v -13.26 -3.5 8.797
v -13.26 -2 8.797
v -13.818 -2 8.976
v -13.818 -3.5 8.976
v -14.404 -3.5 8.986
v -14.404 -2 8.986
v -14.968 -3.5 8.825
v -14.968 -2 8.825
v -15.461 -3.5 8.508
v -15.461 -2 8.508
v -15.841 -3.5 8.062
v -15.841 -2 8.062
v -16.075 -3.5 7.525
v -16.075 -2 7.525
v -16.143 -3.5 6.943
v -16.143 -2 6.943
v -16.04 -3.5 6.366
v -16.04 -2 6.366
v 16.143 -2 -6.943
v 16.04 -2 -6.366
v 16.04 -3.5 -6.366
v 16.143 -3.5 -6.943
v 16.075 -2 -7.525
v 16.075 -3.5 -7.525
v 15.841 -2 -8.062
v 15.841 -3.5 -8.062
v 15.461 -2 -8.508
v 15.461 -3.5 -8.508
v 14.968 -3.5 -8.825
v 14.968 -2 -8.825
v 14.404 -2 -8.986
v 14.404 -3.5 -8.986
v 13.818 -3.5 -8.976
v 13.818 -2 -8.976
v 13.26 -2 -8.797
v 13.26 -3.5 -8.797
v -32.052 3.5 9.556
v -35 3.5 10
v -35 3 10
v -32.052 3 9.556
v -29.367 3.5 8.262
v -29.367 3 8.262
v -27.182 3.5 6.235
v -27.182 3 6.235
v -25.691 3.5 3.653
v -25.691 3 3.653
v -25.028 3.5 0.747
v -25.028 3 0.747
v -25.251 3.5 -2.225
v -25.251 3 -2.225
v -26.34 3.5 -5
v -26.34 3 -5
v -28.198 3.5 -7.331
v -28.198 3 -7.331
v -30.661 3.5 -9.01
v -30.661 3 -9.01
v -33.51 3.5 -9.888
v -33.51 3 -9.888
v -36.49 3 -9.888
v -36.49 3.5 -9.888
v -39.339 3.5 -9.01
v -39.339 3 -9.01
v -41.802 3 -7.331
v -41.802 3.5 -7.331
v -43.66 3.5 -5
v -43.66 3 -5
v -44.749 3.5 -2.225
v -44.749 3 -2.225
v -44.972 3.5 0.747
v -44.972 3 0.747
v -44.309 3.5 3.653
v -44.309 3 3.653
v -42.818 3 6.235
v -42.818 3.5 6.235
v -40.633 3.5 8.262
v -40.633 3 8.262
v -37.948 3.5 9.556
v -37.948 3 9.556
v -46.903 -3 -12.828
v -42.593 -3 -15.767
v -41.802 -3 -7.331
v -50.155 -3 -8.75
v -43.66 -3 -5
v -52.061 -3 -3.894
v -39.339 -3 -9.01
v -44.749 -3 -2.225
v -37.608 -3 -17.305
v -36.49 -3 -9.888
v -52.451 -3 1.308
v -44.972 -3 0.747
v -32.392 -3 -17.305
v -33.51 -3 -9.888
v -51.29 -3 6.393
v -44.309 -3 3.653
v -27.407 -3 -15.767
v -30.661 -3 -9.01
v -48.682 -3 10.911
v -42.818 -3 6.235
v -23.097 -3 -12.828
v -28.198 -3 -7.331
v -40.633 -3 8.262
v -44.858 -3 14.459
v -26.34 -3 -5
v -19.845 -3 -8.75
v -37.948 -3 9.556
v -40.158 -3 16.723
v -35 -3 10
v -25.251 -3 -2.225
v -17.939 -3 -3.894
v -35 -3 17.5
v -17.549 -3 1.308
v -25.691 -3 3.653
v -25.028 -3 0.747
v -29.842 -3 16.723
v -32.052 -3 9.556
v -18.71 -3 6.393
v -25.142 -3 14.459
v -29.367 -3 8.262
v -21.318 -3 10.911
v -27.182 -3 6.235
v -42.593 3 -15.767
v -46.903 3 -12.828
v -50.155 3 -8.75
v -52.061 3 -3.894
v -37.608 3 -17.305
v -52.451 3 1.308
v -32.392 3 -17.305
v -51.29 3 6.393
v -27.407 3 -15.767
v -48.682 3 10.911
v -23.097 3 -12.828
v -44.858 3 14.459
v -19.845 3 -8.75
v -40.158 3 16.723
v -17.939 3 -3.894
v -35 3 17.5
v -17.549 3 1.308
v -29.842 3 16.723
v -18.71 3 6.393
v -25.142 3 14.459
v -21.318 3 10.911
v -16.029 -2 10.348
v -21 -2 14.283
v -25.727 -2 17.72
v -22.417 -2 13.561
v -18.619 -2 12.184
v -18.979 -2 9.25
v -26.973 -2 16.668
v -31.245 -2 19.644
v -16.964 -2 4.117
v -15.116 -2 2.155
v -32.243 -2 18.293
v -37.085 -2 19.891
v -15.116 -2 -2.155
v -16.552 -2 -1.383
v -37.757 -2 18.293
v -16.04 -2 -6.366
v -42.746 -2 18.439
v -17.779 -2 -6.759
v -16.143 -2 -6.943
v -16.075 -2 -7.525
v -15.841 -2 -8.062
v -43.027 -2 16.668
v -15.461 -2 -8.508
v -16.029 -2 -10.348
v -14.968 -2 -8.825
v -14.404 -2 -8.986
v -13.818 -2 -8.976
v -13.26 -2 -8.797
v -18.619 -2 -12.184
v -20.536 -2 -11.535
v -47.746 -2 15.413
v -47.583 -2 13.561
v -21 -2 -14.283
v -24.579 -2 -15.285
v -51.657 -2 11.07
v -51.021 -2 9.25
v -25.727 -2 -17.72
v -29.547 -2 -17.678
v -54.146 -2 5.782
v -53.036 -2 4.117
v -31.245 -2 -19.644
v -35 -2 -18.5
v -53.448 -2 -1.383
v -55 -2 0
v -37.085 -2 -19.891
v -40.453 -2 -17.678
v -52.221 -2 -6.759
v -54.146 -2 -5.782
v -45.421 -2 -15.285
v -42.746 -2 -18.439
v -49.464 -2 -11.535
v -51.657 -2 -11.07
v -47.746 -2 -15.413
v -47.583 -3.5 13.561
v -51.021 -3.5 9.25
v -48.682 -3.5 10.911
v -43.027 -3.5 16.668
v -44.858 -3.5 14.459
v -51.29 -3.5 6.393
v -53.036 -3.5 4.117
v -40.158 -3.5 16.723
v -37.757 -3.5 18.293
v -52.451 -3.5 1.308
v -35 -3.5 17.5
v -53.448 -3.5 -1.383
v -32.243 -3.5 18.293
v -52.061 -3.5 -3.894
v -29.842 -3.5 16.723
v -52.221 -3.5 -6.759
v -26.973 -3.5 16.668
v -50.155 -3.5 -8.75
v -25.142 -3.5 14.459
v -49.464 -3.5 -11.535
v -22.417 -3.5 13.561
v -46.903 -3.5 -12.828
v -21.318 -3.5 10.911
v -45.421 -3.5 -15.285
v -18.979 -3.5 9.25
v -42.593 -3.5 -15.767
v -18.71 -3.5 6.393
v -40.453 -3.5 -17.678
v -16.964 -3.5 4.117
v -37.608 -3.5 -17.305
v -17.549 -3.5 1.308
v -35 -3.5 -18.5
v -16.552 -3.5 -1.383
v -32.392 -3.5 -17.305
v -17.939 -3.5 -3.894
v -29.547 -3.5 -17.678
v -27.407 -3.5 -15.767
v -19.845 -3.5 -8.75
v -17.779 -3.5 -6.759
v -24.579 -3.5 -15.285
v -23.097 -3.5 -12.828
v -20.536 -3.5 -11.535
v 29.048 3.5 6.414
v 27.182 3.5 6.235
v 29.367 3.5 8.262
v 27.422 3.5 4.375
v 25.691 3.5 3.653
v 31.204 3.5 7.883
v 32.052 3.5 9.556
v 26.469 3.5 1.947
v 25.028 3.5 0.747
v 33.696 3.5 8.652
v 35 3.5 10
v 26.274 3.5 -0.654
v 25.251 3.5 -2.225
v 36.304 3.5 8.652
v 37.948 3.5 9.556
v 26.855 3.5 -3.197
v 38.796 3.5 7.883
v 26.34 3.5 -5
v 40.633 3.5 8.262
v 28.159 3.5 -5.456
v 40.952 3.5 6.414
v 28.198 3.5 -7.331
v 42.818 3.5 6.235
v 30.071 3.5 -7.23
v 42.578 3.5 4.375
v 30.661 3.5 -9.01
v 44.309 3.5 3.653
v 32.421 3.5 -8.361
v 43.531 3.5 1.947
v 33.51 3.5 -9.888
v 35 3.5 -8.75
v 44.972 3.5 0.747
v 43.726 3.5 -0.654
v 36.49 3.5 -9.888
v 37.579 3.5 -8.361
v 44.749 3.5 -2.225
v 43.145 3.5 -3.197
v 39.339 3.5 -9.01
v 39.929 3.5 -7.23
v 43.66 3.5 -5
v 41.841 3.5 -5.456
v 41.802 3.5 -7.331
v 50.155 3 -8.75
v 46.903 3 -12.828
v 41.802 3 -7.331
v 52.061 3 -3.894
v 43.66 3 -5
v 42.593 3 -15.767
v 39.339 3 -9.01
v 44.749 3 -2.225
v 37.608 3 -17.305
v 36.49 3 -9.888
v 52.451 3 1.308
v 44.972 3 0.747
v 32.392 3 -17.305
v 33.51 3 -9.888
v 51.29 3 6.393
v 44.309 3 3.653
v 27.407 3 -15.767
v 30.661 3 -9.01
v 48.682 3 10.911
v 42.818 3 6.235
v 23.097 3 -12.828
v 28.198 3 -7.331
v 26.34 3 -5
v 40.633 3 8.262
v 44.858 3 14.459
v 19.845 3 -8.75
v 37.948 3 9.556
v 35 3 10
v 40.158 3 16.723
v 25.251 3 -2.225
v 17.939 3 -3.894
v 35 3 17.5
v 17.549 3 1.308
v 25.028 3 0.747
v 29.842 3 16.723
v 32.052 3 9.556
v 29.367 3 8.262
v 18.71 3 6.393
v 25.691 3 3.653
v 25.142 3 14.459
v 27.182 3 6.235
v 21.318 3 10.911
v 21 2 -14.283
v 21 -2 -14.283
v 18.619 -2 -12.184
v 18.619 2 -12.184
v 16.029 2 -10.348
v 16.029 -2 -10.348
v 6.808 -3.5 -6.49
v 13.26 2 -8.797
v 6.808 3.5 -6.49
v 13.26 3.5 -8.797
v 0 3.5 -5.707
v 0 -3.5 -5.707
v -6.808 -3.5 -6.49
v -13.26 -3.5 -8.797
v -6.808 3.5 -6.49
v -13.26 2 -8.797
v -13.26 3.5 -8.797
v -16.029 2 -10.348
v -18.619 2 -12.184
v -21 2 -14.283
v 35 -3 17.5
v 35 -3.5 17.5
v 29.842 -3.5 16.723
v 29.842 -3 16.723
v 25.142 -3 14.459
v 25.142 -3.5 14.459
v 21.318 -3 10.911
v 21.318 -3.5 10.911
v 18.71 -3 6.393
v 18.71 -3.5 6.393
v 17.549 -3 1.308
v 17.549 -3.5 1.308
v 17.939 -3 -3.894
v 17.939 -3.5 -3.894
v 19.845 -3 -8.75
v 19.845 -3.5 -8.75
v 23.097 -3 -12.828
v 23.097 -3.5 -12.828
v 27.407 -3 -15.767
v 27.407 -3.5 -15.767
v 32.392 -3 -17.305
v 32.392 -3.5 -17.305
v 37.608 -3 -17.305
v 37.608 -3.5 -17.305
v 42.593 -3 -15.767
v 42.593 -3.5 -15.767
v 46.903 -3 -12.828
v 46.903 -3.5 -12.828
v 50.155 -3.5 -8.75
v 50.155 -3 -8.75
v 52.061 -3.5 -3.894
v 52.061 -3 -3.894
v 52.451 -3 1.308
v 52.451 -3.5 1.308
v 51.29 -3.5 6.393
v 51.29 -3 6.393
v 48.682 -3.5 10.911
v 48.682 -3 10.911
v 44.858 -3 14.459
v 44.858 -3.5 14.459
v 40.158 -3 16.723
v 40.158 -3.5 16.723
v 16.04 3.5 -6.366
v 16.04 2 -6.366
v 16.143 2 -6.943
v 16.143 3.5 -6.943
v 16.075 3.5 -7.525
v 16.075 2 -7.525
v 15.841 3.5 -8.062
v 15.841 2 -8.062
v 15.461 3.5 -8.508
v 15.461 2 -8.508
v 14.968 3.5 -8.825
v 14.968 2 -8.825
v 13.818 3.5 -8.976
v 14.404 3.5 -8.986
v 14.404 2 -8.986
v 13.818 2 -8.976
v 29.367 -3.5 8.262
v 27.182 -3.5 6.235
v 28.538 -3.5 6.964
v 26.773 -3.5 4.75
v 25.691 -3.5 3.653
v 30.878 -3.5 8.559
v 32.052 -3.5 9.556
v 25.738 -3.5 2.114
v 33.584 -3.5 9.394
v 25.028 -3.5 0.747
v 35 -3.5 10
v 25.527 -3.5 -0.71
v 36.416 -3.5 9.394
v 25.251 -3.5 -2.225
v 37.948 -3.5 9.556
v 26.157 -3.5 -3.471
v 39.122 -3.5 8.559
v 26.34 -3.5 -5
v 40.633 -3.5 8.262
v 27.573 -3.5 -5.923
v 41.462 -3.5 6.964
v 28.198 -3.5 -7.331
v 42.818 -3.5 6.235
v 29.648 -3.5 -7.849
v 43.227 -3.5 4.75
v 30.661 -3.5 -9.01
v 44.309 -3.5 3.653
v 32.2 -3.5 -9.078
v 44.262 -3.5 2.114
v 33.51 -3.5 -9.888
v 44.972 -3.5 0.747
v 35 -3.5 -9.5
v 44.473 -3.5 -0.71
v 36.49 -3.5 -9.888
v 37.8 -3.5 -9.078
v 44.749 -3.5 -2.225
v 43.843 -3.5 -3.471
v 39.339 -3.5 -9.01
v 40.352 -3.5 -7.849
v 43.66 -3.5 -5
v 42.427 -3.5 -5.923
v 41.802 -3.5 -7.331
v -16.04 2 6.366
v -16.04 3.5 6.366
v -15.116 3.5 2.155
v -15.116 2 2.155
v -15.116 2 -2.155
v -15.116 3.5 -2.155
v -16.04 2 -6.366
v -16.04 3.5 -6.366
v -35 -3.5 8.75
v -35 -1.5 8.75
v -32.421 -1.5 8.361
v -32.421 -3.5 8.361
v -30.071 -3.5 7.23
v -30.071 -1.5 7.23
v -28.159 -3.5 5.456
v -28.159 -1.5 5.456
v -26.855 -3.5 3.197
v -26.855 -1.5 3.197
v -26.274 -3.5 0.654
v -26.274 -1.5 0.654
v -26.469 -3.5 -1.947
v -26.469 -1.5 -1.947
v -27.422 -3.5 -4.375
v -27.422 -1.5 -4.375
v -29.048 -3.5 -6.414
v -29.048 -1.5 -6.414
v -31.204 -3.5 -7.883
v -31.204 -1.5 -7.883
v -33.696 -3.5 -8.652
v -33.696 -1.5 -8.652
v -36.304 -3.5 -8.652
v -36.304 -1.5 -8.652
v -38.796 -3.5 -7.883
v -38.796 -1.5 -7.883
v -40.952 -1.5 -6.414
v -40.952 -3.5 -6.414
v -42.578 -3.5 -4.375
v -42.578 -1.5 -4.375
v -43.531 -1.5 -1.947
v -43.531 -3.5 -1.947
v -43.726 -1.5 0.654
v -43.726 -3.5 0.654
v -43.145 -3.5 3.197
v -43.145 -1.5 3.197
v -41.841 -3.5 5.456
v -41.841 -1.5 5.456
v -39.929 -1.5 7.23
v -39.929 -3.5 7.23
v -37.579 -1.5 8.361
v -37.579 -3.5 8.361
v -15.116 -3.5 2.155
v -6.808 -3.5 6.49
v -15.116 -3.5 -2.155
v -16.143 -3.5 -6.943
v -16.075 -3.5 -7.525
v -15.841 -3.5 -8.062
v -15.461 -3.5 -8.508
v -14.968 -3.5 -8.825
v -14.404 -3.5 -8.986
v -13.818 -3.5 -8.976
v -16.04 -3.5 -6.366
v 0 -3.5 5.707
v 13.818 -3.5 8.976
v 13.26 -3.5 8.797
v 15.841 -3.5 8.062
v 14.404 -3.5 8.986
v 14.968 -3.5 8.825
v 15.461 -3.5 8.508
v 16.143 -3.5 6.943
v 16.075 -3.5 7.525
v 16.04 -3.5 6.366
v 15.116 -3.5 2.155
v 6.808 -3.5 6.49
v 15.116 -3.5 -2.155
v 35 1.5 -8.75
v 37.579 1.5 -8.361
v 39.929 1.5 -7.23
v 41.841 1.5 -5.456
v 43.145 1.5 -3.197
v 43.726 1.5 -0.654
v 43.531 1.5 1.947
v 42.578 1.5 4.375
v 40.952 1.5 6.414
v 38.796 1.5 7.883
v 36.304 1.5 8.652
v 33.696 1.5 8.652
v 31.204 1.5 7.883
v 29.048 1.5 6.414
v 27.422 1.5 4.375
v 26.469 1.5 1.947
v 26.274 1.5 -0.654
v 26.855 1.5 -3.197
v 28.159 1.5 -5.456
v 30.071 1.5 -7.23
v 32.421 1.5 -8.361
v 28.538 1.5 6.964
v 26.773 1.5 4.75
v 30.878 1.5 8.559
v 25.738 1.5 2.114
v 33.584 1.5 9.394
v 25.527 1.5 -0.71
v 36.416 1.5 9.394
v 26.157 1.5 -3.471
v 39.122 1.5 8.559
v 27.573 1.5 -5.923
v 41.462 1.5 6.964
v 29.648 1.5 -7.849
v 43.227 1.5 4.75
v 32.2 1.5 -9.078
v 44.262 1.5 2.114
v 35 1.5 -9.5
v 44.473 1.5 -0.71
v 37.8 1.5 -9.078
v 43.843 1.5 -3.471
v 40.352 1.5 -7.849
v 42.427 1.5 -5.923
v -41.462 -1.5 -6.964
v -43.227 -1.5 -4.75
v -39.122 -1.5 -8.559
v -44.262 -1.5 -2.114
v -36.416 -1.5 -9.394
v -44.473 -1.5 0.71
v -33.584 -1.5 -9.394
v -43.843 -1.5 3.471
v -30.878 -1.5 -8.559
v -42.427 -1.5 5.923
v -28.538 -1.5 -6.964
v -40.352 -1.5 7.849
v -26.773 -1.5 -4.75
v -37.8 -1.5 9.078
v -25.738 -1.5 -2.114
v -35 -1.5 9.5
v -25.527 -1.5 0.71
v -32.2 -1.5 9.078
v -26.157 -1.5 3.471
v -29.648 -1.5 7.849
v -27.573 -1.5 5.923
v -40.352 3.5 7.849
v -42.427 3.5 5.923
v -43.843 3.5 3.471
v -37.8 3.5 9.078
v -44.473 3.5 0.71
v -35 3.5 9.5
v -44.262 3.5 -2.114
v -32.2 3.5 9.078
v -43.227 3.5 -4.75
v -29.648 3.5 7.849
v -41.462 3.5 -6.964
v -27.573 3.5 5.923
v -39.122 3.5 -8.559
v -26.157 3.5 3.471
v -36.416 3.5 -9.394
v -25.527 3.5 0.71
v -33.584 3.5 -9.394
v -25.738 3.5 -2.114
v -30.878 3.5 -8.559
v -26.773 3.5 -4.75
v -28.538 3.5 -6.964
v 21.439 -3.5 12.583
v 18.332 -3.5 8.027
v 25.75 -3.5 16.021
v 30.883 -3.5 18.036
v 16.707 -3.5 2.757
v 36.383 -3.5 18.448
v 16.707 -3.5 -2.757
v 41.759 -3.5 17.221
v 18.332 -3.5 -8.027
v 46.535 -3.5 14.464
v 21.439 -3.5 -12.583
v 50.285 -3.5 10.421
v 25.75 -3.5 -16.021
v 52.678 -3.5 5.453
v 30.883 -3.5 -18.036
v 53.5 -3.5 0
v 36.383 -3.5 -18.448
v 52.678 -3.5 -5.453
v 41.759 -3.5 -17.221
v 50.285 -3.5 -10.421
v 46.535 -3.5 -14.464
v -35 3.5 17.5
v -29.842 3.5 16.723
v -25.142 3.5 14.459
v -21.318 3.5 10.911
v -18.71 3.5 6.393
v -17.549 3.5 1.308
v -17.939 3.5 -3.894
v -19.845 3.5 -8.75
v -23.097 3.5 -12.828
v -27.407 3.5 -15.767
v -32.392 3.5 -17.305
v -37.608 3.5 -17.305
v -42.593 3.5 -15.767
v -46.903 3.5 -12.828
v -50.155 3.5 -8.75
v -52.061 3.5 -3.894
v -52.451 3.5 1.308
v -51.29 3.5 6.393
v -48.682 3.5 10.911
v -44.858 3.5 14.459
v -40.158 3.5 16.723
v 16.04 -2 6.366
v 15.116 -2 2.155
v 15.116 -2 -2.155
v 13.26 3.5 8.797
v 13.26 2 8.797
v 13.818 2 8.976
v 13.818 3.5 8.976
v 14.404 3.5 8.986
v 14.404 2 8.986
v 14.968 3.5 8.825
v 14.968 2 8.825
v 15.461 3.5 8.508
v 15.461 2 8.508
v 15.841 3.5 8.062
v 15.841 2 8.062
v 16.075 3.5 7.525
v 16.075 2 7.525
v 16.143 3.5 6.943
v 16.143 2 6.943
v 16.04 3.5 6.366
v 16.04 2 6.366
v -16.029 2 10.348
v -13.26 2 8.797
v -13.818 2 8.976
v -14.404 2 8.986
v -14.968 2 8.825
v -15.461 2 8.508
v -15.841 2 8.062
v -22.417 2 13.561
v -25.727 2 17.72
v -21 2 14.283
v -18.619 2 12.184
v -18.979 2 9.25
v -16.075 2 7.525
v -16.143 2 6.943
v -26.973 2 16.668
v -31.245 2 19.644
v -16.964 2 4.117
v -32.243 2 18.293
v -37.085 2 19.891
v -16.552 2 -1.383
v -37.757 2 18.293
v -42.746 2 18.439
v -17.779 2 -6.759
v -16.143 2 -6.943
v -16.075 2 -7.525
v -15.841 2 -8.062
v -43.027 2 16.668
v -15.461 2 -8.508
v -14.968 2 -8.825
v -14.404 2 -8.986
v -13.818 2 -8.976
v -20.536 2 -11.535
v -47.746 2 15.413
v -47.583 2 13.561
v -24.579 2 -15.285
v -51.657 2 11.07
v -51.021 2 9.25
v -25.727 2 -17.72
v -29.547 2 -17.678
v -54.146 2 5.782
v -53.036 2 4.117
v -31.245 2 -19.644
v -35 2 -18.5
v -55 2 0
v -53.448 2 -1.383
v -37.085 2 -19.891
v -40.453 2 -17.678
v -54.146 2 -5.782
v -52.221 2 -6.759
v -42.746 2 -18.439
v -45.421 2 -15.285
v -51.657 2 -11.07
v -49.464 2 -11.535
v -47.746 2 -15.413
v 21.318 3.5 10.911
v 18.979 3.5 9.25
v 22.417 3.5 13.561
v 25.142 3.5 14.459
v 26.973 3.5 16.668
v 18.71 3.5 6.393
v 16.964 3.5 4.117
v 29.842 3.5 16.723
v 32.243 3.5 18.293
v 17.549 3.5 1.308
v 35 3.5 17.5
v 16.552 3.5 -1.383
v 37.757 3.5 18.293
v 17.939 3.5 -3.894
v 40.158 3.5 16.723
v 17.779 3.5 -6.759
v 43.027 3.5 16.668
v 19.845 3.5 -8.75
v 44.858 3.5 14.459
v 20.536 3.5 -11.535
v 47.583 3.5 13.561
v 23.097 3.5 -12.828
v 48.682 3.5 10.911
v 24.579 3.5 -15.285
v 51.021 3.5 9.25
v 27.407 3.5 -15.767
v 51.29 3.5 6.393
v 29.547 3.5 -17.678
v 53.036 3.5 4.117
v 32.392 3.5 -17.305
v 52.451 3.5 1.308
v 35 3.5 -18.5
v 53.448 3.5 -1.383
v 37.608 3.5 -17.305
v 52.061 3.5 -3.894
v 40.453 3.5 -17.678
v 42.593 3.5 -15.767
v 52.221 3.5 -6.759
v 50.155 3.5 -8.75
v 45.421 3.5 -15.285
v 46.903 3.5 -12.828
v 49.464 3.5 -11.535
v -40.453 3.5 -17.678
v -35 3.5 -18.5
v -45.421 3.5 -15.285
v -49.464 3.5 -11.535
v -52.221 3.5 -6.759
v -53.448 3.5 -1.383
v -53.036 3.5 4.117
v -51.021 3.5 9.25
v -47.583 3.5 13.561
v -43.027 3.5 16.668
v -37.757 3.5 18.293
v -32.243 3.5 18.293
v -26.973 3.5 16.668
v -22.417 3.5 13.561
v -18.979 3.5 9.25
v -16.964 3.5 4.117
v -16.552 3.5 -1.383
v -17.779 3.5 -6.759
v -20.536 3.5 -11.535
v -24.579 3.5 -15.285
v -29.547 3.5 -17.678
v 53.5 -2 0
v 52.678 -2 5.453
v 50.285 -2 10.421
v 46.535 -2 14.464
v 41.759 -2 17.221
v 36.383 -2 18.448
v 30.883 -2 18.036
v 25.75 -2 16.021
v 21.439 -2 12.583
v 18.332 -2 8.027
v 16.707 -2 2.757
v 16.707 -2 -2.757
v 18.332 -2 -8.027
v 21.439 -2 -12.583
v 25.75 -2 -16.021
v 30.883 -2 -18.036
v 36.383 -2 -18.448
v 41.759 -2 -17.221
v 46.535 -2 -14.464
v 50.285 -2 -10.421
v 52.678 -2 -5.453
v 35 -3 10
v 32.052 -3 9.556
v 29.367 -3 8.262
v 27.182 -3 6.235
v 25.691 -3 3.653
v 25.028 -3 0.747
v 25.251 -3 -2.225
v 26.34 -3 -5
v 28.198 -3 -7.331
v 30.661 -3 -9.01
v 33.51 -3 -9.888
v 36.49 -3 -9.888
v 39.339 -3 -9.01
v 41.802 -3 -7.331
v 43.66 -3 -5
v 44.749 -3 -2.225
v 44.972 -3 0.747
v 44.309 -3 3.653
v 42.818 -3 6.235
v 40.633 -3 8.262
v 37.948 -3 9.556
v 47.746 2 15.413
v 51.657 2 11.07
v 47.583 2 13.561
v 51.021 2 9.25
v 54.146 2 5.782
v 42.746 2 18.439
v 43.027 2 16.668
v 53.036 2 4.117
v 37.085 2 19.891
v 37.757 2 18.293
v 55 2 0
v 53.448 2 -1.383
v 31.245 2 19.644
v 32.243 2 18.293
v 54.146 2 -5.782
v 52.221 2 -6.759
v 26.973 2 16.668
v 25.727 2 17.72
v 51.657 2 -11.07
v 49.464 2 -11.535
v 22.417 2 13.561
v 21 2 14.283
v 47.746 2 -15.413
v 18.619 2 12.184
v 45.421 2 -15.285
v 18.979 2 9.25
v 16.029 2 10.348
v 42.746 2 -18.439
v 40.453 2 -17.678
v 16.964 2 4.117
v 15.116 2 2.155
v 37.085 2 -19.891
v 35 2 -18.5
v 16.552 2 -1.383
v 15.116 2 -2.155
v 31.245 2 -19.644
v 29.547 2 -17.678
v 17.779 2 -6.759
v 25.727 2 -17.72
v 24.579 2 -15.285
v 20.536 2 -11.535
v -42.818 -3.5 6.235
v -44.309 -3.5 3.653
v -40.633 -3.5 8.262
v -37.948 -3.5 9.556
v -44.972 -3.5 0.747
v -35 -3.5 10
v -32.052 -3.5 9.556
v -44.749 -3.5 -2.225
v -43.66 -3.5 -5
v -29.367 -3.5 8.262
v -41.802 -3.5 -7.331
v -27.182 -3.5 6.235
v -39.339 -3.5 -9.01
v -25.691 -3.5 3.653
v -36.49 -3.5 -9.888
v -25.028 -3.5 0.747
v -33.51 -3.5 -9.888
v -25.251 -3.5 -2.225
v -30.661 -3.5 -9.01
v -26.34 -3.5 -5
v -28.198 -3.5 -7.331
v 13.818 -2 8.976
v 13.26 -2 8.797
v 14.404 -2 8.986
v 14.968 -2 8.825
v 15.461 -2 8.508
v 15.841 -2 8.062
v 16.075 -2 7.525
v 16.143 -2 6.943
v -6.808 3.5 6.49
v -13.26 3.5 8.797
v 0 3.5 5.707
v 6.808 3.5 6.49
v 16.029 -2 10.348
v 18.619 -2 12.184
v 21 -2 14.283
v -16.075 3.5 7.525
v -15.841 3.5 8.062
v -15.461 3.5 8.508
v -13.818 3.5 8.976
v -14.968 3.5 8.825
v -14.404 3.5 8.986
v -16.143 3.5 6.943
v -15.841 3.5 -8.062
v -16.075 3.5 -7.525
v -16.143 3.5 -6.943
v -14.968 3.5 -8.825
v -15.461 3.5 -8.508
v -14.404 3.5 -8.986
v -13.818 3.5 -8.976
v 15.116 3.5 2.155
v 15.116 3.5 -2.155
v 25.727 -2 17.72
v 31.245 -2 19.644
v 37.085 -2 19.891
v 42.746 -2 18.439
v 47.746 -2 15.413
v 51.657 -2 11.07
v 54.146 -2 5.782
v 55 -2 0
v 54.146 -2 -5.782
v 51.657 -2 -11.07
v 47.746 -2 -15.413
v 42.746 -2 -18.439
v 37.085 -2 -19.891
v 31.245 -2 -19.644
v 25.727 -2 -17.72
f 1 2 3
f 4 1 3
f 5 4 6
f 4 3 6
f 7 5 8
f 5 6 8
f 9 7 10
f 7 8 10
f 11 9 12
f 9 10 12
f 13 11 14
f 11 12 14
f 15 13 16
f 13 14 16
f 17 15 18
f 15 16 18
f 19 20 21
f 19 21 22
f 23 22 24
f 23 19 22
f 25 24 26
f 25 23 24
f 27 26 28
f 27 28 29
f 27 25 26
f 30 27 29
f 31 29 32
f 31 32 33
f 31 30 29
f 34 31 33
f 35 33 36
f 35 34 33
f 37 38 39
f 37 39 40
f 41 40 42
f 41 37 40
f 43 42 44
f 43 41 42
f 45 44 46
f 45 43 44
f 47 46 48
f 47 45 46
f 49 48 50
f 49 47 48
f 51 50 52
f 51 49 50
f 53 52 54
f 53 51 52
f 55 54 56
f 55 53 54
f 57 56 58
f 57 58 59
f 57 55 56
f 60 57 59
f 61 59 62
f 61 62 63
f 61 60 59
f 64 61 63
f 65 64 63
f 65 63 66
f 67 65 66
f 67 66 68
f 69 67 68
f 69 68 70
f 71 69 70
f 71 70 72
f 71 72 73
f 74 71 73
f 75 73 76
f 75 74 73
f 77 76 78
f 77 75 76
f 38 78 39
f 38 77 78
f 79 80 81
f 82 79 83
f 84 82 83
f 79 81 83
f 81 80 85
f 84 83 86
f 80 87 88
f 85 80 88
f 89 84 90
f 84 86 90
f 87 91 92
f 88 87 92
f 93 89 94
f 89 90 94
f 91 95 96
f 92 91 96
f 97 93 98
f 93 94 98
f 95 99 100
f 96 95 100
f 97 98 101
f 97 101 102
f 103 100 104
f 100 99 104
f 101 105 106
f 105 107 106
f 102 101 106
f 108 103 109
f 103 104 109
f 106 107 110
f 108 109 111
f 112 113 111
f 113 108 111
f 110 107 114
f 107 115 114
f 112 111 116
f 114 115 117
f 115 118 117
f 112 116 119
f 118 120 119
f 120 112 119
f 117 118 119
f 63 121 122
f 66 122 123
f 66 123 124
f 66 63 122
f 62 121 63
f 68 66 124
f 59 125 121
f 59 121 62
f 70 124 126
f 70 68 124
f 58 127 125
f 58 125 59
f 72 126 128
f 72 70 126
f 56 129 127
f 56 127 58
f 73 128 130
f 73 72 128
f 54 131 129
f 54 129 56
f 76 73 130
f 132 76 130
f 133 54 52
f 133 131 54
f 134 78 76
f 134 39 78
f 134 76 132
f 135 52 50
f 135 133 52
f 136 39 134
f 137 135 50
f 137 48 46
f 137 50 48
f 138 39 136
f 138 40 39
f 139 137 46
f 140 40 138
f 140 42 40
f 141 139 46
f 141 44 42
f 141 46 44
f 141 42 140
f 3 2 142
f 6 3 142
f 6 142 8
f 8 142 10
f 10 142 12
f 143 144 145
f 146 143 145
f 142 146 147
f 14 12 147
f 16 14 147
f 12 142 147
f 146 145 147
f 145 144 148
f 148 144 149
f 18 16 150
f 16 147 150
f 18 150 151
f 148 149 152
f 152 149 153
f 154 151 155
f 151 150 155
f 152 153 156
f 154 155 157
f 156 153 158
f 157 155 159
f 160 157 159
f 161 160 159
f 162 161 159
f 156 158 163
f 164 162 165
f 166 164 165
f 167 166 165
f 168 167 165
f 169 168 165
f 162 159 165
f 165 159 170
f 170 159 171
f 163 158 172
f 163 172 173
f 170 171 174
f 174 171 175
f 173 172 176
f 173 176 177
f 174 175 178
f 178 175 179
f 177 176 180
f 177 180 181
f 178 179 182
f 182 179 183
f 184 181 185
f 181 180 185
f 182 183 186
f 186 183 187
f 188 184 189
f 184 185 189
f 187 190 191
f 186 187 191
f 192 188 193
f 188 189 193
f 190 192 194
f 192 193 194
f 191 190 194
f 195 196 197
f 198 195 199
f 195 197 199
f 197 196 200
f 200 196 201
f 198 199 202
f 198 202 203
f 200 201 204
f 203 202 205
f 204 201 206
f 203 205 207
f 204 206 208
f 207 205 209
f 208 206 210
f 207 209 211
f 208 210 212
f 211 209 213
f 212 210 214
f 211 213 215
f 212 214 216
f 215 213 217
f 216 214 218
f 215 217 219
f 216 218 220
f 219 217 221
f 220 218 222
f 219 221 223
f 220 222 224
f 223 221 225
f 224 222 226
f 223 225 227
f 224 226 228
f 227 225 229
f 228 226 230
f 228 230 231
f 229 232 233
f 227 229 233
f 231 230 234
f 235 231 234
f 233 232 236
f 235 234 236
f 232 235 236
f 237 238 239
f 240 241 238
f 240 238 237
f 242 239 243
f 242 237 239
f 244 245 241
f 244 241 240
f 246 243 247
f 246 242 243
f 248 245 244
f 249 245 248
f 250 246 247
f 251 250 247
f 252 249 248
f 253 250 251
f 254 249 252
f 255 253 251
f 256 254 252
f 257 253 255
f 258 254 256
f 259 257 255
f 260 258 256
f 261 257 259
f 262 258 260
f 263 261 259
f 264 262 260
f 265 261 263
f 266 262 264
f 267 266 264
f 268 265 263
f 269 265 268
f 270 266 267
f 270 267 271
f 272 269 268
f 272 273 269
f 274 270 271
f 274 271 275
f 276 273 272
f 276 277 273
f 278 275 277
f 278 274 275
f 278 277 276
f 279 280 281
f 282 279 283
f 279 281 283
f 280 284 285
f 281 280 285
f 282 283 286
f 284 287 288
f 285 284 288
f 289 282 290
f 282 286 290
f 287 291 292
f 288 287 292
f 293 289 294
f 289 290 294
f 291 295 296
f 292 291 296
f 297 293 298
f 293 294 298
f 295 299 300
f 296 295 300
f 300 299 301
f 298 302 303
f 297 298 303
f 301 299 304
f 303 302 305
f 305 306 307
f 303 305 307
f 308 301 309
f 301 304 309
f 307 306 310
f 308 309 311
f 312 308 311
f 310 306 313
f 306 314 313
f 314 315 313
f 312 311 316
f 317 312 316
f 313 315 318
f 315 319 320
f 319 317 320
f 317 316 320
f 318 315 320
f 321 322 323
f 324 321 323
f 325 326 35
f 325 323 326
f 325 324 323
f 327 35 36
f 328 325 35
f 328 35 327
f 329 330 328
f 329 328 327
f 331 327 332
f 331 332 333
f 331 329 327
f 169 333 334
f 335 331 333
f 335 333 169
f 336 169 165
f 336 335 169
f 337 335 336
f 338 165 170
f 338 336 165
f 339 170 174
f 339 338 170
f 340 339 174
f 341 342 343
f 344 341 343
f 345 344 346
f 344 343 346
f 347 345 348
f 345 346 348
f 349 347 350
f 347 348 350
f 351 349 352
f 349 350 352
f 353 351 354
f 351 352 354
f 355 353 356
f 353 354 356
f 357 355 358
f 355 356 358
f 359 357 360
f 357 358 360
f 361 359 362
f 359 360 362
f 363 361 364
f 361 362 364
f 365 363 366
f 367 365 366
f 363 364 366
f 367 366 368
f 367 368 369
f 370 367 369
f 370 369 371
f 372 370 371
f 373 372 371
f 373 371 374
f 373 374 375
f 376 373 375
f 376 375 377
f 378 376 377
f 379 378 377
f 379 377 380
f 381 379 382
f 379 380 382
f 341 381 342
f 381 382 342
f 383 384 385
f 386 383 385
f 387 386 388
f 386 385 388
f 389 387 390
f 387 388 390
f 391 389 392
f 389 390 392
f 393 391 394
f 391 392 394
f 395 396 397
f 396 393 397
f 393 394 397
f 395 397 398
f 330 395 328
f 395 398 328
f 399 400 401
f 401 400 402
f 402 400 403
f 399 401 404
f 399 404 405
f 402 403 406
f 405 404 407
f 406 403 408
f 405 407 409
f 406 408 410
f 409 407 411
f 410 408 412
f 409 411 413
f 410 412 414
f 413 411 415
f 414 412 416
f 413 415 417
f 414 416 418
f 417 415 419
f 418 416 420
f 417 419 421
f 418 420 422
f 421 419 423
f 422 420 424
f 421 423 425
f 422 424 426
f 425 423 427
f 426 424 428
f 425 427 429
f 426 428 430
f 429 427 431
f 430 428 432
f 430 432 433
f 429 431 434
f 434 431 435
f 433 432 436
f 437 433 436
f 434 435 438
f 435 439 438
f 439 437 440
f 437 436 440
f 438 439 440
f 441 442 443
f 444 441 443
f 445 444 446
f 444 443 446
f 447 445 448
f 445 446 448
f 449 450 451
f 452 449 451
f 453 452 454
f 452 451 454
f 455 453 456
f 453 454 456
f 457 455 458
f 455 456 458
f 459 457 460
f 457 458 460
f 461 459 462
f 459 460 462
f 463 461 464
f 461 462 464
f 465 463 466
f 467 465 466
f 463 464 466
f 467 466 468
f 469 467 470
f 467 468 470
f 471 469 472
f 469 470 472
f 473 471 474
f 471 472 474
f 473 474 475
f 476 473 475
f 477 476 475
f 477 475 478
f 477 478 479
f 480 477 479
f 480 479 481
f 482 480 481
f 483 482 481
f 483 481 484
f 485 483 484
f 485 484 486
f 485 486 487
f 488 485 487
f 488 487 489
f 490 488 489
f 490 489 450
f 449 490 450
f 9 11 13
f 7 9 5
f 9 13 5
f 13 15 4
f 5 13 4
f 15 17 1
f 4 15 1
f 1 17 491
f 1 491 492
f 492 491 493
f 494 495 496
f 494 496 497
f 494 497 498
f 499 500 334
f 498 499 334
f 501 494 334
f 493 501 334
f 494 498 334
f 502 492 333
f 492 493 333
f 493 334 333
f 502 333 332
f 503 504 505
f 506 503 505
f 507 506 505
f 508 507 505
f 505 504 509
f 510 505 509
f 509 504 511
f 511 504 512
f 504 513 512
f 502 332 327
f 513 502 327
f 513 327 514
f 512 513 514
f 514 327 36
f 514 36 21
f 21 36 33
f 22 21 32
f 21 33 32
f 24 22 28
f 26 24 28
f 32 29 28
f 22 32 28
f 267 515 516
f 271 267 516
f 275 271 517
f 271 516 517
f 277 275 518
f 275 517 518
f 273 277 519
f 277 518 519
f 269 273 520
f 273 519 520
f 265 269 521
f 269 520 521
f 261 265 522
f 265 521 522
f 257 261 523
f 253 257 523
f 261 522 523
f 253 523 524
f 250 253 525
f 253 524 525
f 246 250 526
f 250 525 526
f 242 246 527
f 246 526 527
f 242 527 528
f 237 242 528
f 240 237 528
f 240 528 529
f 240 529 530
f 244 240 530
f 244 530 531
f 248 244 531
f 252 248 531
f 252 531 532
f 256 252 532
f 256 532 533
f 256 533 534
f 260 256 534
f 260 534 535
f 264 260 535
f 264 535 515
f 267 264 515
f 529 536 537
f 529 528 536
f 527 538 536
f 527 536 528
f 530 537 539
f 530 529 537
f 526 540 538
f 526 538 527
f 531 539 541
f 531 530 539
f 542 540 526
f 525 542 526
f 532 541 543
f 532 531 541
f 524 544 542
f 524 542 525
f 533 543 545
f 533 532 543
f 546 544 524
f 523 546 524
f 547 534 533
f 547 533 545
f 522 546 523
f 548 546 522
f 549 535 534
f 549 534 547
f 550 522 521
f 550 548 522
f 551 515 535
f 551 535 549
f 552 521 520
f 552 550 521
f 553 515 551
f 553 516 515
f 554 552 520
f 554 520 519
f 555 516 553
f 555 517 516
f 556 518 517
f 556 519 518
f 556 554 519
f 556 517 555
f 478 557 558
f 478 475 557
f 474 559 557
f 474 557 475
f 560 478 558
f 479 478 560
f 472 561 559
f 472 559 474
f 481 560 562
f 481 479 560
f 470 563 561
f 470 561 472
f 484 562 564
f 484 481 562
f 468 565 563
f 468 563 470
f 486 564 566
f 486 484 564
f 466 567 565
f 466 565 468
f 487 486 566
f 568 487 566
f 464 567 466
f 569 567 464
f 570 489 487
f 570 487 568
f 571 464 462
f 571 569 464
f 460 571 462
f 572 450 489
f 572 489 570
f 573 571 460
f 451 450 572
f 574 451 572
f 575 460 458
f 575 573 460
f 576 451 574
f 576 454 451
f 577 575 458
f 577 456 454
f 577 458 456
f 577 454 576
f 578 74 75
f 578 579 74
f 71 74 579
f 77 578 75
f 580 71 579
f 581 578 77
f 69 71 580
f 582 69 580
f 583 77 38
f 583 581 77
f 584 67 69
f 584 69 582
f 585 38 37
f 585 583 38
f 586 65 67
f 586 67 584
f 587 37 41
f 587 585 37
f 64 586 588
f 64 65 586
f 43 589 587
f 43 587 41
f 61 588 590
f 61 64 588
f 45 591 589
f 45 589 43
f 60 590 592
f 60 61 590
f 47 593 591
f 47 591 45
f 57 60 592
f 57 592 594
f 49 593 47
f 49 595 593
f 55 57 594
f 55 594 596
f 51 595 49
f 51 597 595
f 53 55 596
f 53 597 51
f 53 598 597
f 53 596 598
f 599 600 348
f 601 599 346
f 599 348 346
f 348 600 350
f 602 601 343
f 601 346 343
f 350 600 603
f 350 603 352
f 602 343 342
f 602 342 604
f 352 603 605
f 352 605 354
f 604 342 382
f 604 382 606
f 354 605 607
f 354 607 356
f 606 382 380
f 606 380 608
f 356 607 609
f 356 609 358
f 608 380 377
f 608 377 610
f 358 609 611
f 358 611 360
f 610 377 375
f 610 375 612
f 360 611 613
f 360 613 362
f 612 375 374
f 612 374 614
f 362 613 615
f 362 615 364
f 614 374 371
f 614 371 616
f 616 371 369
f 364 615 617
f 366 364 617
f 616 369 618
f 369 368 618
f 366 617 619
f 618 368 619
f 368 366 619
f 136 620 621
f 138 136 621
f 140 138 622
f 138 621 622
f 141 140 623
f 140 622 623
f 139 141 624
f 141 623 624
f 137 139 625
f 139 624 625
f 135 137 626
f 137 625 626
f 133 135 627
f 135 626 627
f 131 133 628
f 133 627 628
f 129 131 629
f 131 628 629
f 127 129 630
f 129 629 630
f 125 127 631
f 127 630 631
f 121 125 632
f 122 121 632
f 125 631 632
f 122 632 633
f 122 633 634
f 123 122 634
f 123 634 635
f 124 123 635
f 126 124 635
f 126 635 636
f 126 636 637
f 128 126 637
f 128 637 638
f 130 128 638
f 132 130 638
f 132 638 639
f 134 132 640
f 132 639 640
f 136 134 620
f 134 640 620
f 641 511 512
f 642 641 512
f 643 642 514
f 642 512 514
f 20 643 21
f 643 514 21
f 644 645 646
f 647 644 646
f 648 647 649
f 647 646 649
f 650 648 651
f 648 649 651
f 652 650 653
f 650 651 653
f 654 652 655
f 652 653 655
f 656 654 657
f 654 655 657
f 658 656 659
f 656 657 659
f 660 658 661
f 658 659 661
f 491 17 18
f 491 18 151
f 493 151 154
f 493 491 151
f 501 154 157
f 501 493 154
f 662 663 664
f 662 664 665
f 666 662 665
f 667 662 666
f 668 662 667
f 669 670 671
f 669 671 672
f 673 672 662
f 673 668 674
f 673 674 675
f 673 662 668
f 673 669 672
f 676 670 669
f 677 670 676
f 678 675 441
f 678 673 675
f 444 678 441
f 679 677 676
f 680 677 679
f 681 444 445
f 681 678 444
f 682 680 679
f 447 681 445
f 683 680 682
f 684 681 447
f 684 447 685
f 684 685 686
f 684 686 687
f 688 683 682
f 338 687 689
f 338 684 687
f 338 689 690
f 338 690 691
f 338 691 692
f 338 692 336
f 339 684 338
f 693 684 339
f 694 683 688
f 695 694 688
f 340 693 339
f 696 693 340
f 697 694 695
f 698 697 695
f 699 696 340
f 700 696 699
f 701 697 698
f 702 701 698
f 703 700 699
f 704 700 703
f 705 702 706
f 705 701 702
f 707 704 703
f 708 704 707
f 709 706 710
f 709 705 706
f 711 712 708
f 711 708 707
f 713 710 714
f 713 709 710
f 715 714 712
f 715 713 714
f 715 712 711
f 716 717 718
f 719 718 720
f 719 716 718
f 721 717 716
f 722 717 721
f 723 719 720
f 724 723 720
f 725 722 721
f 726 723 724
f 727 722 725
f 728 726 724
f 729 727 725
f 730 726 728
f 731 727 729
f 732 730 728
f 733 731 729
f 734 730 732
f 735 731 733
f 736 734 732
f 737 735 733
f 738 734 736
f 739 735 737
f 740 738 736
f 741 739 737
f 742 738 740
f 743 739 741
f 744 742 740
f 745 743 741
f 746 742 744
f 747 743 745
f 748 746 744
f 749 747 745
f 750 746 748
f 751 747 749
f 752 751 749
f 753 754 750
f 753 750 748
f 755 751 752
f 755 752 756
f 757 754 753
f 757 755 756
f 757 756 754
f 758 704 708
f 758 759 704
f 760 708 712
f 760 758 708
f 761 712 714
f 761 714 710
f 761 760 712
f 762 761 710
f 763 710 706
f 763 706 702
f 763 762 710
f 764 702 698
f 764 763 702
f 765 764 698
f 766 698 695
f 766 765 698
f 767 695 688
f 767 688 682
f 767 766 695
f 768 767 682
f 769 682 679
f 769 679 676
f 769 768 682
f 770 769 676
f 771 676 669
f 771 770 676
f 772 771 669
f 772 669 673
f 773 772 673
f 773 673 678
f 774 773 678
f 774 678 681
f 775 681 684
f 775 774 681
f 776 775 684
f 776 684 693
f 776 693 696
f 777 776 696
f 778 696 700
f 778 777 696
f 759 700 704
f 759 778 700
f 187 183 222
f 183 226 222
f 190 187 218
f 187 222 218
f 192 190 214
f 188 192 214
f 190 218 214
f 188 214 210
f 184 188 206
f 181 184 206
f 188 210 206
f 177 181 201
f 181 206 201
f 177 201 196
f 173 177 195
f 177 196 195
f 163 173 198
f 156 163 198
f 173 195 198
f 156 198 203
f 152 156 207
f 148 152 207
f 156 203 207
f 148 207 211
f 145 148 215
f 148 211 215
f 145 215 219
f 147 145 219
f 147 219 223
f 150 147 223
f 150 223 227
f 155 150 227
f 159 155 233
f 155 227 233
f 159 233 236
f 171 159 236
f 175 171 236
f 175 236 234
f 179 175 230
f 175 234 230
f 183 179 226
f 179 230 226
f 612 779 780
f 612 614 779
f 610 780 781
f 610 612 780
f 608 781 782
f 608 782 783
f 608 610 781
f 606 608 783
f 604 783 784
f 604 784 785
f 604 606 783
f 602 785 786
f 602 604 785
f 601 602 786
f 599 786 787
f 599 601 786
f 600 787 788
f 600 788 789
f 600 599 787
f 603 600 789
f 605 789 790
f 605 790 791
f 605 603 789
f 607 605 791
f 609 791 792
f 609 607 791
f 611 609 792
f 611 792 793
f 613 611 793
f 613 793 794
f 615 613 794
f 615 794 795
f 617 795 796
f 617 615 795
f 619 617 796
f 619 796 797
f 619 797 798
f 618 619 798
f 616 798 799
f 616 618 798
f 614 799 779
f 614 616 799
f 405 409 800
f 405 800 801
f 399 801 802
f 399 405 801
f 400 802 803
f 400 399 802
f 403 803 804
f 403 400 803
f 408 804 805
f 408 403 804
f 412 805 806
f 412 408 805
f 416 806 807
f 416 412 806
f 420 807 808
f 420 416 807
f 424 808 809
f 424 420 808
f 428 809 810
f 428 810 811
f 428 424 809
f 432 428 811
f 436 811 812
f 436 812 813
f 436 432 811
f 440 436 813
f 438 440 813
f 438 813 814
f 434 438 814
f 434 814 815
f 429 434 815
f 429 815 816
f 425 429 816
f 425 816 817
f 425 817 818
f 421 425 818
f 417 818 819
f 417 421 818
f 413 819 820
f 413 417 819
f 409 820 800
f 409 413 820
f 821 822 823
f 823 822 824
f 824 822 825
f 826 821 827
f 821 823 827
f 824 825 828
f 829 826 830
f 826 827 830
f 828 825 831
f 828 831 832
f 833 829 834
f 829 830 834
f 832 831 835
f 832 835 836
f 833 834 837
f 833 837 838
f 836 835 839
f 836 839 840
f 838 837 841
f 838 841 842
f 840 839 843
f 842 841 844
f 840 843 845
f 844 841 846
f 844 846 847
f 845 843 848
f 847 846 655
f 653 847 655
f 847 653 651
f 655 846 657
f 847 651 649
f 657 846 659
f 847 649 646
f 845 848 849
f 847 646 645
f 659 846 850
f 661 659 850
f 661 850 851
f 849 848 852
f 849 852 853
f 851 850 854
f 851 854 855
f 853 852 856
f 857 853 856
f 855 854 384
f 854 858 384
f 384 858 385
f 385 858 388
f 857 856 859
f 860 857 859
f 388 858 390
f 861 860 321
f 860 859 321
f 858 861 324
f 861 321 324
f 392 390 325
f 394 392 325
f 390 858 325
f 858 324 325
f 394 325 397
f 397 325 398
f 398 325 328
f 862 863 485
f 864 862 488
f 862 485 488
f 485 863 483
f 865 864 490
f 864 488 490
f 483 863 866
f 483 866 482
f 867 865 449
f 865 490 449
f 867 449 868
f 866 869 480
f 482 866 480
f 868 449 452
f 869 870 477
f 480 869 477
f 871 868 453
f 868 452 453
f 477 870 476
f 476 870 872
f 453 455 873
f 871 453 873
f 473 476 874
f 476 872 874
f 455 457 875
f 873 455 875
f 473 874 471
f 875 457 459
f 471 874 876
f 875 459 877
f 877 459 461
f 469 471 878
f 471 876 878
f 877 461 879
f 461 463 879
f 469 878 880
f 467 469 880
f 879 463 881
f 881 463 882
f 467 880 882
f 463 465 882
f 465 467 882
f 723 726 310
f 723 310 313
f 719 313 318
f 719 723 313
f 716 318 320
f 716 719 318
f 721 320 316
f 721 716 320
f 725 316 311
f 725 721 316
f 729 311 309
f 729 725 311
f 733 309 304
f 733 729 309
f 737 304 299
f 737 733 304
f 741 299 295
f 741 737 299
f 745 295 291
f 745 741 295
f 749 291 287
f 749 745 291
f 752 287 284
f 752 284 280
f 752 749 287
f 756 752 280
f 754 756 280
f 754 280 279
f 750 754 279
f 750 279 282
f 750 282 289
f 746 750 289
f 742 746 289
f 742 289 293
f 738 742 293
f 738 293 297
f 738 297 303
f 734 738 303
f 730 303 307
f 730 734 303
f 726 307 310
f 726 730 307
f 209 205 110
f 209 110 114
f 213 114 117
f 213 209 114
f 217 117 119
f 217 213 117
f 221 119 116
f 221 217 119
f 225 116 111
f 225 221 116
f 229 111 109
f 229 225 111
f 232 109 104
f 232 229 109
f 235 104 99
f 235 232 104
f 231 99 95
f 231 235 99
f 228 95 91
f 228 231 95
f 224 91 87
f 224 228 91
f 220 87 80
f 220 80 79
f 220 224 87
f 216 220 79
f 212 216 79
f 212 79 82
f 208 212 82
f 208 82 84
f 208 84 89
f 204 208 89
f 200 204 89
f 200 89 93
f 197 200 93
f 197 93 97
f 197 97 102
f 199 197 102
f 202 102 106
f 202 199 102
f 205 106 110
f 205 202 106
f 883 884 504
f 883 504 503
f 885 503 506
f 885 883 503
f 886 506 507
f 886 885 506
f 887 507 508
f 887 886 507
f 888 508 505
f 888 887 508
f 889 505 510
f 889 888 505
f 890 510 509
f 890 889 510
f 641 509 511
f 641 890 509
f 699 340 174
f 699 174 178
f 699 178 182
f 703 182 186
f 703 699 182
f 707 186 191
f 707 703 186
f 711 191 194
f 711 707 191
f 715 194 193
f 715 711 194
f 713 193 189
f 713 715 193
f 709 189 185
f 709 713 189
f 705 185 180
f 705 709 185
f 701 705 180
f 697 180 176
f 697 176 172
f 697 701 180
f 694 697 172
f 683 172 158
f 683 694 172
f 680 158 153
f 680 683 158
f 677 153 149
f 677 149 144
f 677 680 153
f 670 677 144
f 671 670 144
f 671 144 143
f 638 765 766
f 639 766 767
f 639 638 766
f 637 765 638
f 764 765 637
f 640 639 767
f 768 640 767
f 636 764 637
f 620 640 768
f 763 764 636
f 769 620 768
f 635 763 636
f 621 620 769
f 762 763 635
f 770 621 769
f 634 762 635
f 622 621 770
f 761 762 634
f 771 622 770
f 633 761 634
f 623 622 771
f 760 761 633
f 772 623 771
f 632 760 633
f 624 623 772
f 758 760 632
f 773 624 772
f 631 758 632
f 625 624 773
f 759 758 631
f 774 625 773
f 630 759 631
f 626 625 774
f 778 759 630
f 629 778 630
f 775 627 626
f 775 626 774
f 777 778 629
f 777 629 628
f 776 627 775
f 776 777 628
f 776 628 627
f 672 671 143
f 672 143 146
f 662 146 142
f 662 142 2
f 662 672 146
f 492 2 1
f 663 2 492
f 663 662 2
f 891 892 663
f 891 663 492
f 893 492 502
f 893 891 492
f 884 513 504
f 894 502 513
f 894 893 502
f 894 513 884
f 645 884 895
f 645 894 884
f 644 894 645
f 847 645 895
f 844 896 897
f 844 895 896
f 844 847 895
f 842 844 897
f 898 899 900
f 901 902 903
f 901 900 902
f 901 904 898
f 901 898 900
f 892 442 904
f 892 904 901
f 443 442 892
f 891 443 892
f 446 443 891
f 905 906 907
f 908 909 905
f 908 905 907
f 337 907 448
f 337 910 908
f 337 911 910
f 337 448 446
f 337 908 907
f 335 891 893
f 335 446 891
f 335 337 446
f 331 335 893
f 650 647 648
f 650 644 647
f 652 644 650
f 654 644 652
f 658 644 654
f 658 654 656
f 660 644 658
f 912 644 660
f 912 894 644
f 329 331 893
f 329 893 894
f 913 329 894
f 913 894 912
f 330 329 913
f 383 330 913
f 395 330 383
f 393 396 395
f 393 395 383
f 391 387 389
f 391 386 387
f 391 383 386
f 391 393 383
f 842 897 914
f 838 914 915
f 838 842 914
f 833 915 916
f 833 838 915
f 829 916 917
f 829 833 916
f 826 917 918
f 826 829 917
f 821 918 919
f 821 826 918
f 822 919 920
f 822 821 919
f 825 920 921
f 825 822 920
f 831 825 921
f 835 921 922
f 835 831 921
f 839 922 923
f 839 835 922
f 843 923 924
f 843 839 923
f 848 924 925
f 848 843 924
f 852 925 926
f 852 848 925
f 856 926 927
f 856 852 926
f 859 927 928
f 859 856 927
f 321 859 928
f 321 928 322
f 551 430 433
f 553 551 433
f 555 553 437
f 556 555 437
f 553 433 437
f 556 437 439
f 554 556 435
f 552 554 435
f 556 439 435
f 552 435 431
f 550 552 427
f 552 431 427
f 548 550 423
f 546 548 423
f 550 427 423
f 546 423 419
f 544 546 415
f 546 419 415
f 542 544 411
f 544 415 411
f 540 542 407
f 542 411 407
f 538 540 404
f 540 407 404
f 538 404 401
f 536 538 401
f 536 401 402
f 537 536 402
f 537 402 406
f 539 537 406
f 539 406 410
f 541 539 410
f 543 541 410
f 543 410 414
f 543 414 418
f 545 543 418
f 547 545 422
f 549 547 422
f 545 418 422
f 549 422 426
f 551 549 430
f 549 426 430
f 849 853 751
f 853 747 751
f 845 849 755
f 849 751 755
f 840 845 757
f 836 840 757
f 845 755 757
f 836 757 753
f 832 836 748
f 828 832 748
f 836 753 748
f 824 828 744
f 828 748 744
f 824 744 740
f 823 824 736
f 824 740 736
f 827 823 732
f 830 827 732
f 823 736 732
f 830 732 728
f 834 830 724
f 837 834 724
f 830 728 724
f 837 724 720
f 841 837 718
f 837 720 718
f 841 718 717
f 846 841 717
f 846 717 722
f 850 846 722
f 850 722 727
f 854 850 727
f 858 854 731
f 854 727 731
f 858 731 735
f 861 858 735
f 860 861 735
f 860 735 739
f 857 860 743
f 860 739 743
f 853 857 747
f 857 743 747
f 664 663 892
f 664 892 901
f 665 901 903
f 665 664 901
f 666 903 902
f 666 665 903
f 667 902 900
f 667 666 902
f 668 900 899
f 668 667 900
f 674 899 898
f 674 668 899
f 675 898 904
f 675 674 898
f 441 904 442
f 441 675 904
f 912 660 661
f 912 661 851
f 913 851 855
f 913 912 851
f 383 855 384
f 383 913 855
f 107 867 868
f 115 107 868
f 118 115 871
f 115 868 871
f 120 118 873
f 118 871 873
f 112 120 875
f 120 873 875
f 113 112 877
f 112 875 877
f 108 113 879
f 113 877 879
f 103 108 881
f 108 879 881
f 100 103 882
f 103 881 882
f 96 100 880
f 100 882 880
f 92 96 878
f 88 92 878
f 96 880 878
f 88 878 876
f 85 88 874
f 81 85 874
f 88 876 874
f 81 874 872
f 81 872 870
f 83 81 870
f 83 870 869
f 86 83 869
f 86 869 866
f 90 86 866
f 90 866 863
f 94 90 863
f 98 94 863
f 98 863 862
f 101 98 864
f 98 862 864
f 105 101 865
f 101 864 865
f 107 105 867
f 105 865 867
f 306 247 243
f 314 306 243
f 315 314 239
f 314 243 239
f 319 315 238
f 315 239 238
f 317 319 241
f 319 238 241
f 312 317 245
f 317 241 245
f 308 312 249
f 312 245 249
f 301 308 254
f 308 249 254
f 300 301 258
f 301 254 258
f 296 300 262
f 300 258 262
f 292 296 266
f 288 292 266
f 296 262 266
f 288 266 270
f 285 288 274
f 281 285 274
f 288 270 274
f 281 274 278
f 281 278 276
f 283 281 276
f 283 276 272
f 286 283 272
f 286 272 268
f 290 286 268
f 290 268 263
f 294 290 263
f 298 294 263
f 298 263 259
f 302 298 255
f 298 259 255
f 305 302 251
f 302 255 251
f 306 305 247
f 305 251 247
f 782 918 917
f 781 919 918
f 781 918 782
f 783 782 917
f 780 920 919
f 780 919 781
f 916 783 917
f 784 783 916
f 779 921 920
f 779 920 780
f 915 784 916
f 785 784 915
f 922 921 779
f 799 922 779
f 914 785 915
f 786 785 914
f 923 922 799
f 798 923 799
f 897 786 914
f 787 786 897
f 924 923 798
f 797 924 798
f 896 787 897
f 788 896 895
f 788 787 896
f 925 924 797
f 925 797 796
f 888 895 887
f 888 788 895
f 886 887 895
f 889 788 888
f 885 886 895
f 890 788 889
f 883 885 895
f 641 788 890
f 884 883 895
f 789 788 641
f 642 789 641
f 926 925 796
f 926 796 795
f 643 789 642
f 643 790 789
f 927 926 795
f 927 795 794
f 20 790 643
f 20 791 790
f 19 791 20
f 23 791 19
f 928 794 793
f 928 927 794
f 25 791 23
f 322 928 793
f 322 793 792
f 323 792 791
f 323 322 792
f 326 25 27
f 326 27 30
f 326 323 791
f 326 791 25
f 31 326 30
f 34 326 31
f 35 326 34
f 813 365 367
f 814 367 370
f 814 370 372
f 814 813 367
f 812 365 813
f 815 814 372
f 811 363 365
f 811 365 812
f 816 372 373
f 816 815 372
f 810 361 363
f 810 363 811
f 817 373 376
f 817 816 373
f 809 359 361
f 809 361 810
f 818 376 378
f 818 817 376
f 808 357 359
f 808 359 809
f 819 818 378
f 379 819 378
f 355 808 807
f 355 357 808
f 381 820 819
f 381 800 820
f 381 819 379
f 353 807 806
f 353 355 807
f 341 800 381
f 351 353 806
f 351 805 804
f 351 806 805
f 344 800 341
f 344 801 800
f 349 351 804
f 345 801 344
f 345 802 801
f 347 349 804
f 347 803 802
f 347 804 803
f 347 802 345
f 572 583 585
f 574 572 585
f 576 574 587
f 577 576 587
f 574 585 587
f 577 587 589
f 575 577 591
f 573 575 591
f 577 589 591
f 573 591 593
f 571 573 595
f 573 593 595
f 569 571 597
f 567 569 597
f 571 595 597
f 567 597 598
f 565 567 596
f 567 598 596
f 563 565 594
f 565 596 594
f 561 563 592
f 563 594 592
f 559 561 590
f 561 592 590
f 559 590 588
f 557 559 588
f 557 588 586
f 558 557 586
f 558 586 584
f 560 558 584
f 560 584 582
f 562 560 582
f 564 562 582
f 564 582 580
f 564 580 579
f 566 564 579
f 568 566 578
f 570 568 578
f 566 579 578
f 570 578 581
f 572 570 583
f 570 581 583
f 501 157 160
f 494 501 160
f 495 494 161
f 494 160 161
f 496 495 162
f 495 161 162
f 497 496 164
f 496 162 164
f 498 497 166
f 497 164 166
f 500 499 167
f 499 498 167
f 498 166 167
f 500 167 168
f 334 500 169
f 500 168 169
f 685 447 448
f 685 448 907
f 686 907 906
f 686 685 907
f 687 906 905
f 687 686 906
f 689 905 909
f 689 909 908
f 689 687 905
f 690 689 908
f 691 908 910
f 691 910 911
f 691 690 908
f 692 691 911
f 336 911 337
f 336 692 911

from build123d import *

# Parameters (mm, degrees)
BOSS_EXTRUDE1_DEPTH       = 3.5
SKETCH2_R                 = 9.5
CUT_EXTRUDE1_DEPTH        = 5
SKETCH3_R                 = 8.75
CUT_EXTRUDE2_DEPTH        = 59.736700622
SKETCH4_R                 = 9.5
CUT_EXTRUDE3_DEPTH        = 5
SKETCH5_R                 = 8.75
CUT_EXTRUDE4_DEPTH        = 59.736700622
SKETCH6_R                 = 17.5
SKETCH6_R_2               = 10
CUT_EXTRUDE5_DEPTH        = 0.5
SKETCH7_W                 = 1.5
SKETCH7_H                 = 1.5
FILLET1_START             = 2
FILLET1_DEPTH             = 2
MIRROR2_COPY_1_SKETCH_R   = 17.5
MIRROR2_COPY_1_SKETCH_R_2 = 10
MIRROR2_COPY_1_DEPTH      = 0.5
MIRROR2_COPY_2_SKETCH_W   = 1.5
MIRROR2_COPY_2_SKETCH_H   = 1.5
MIRROR2_START             = 2
MIRROR2_COPY_3_DEPTH      = 2


with BuildPart() as part:
    # Sketch1 → Boss-Extrude1 (new, symmetric)
    with BuildSketch(Plane(origin=(0, 0, 0), x_dir=(1, 0, 0), z_dir=(0, 1, 0))):
        with BuildLine():
            ThreePointArc((-21, 14.282856857), (-55, 0), (-21, -14.282856857))
            ThreePointArc((-21, -14.282856857), (0, -5.707142143), (21, -14.282856857))
            ThreePointArc((21, -14.282856857), (55, 0), (21, 14.282856857))
            ThreePointArc((21, 14.282856857), (0, 5.707142143), (-21, 14.282856857))
        make_face()
    extrude(amount=BOSS_EXTRUDE1_DEPTH, both=True)

    # Sketch2 → Cut-Extrude1 (cut)
    with BuildSketch(Plane(origin=(0, 3.5, 0), x_dir=(1, 0, 0), z_dir=(0, 1, 0))):
        with Locations(Location((-35, 0, 0), (0, 0, 270))):
            Circle(SKETCH2_R)
    extrude(amount=-CUT_EXTRUDE1_DEPTH, mode=Mode.SUBTRACT)

    # Sketch3 → Cut-Extrude2 (cut, through all)
    with BuildSketch(Plane(origin=(0, -1.5, 0), x_dir=(1, 0, 0), z_dir=(0, 1, 0))):
        with Locations(Location((-35, 0, 0), (0, 0, 270))):
            Circle(SKETCH3_R)
    extrude(amount=-CUT_EXTRUDE2_DEPTH, mode=Mode.SUBTRACT)

    # Sketch4 → Cut-Extrude3 (cut)
    with BuildSketch(Plane.XZ.offset(3.5)):
        with Locations(Location((35, 0, 0), (0, 0, 270))):
            Circle(SKETCH4_R)
    extrude(amount=-CUT_EXTRUDE3_DEPTH, mode=Mode.SUBTRACT)

    # Sketch5 → Cut-Extrude4 (cut, through all)
    with BuildSketch(Plane.XZ.offset(-1.5)):
        with Locations(Location((35, 0, 0), (0, 0, 270))):
            Circle(SKETCH5_R)
    extrude(amount=-CUT_EXTRUDE4_DEPTH, mode=Mode.SUBTRACT)

    # Sketch6 → Cut-Extrude5 (cut)
    with BuildSketch(Plane(origin=(0, 3.5, 0), x_dir=(1, 0, 0), z_dir=(0, 1, 0))):
        with Locations(Location((-35, 0, 0), (0, 0, 270))):
            Circle(SKETCH6_R)
        with Locations(Location((-35, 0, 0), (0, 0, 270))):
            Circle(SKETCH6_R_2, mode=Mode.SUBTRACT)
    cut_extrude5 = extrude(amount=-CUT_EXTRUDE5_DEPTH, mode=Mode.SUBTRACT)

    # Sketch7 → Cut-Revolve1 (revolve, cut)
    with BuildSketch(Plane.XY, mode=Mode.PRIVATE) as cut_revolve1_sk:
        with Locations((-54.25, 2.75)):
            Rectangle(SKETCH7_W, SKETCH7_H)
    cut_revolve1 = revolve(cut_revolve1_sk.sketch.rotate(Axis((-35, -6.63312042, 0), (0, 1, 0)), 270), axis=Axis((-35, -6.63312042, 0), (0, 1, 0)), mode=Mode.SUBTRACT)

    # Fillet1: read off the stored shape, not the designer's step
    # Fillet1 outline → Fillet1 (cut)
    with BuildSketch(Plane(origin=(0, 0, 0), x_dir=(1, 0, 0), z_dir=(0, 1, 0)).offset(FILLET1_START)):
        with BuildLine():
            ThreePointArc((-21, -14.282856857), (-17.348361604, -11.231963907), (-13.260269064, -8.796823223))
            ThreePointArc((-13.260269064, -8.796823223), (-15.460727643, -8.508452663), (-16.04026091, -6.366183602))
            ThreePointArc((-16.04026091, -6.366183602), (-18.051415131, -10.618167023), (-21, -14.282856857))
        make_face()
        with BuildLine():
            ThreePointArc((-21, 14.282856857), (-18.051415131, 10.618167023), (-16.04026091, 6.366183602))
            ThreePointArc((-16.04026091, 6.366183602), (-15.460727643, 8.508452663), (-13.260269064, 8.796823223))
            ThreePointArc((-13.260269064, 8.796823223), (-17.348361604, 11.231963907), (-21, 14.282856857))
        make_face()
    fillet1 = extrude(amount=FILLET1_DEPTH, mode=Mode.SUBTRACT)

    # Mirror1: Cut-Extrude5, Cut-Revolve1, Fillet1 across plane
    add(cut_extrude5.mirror(Plane.ZX), mode=Mode.SUBTRACT)
    add(cut_revolve1.mirror(Plane.ZX), mode=Mode.SUBTRACT)
    add(fillet1.mirror(Plane.ZX), mode=Mode.SUBTRACT)

    # Mirror2: Cut-Extrude5, Cut-Revolve1, Fillet1 across plane
    add(cut_extrude5.mirror(Plane(origin=(0, 0, 0), x_dir=(0, 0, 1), z_dir=(1, 0, 0))), mode=Mode.SUBTRACT)
    add(cut_revolve1.mirror(Plane(origin=(0, 0, 0), x_dir=(0, 0, 1), z_dir=(1, 0, 0))), mode=Mode.SUBTRACT)
    add(fillet1.mirror(Plane(origin=(0, 0, 0), x_dir=(0, 0, 1), z_dir=(1, 0, 0))), mode=Mode.SUBTRACT)

    # Mirror2 copy 1 sketch → Mirror2 copy 1 (cut)
    with BuildSketch(Plane(origin=(0, -3.5, 0), x_dir=(-1, 0, 0), z_dir=(0, -1, 0))):
        with Locations(Location((-35, 0, 0), (0, 0, 270))):
            Circle(MIRROR2_COPY_1_SKETCH_R)
        with Locations(Location((-35, 0, 0), (0, 0, 270))):
            Circle(MIRROR2_COPY_1_SKETCH_R_2, mode=Mode.SUBTRACT)
    extrude(amount=-MIRROR2_COPY_1_DEPTH, mode=Mode.SUBTRACT)

    # Mirror2 copy 2 sketch → Mirror2 copy 2 (revolve, cut)
    with BuildSketch(Plane(origin=(0, 0, 0), x_dir=(-1, 0, 0), z_dir=(0, 0, 1))):
        with Locations((-54.25, 2.75)):
            Rectangle(MIRROR2_COPY_2_SKETCH_W, MIRROR2_COPY_2_SKETCH_H)
    revolve(axis=Axis((35, 6.63312042, 0), (0, -1, 0)), mode=Mode.SUBTRACT)

    # Mirror2 copy 3 sketch → Mirror2 copy 3 (cut)
    with BuildSketch(Plane(origin=(0, 0, 0), x_dir=(-1, 0, 0), z_dir=(0, -1, 0)).offset(MIRROR2_START)):
        with BuildLine():
            ThreePointArc((-21, -14.282856857), (-17.348361604, -11.231963907), (-13.260269064, -8.796823223))
            ThreePointArc((-13.260269064, -8.796823223), (-15.460727643, -8.508452663), (-16.04026091, -6.366183602))
            ThreePointArc((-16.04026091, -6.366183602), (-18.051415131, -10.618167023), (-21, -14.282856857))
        make_face()
        with BuildLine():
            ThreePointArc((-21, 14.282856857), (-18.051415131, 10.618167023), (-16.04026091, 6.366183602))
            ThreePointArc((-16.04026091, 6.366183602), (-15.460727643, 8.508452663), (-13.260269064, 8.796823223))
            ThreePointArc((-13.260269064, 8.796823223), (-17.348361604, 11.231963907), (-21, 14.282856857))
        make_face()
    extrude(amount=MIRROR2_COPY_3_DEPTH, mode=Mode.SUBTRACT)


solid = part.part
